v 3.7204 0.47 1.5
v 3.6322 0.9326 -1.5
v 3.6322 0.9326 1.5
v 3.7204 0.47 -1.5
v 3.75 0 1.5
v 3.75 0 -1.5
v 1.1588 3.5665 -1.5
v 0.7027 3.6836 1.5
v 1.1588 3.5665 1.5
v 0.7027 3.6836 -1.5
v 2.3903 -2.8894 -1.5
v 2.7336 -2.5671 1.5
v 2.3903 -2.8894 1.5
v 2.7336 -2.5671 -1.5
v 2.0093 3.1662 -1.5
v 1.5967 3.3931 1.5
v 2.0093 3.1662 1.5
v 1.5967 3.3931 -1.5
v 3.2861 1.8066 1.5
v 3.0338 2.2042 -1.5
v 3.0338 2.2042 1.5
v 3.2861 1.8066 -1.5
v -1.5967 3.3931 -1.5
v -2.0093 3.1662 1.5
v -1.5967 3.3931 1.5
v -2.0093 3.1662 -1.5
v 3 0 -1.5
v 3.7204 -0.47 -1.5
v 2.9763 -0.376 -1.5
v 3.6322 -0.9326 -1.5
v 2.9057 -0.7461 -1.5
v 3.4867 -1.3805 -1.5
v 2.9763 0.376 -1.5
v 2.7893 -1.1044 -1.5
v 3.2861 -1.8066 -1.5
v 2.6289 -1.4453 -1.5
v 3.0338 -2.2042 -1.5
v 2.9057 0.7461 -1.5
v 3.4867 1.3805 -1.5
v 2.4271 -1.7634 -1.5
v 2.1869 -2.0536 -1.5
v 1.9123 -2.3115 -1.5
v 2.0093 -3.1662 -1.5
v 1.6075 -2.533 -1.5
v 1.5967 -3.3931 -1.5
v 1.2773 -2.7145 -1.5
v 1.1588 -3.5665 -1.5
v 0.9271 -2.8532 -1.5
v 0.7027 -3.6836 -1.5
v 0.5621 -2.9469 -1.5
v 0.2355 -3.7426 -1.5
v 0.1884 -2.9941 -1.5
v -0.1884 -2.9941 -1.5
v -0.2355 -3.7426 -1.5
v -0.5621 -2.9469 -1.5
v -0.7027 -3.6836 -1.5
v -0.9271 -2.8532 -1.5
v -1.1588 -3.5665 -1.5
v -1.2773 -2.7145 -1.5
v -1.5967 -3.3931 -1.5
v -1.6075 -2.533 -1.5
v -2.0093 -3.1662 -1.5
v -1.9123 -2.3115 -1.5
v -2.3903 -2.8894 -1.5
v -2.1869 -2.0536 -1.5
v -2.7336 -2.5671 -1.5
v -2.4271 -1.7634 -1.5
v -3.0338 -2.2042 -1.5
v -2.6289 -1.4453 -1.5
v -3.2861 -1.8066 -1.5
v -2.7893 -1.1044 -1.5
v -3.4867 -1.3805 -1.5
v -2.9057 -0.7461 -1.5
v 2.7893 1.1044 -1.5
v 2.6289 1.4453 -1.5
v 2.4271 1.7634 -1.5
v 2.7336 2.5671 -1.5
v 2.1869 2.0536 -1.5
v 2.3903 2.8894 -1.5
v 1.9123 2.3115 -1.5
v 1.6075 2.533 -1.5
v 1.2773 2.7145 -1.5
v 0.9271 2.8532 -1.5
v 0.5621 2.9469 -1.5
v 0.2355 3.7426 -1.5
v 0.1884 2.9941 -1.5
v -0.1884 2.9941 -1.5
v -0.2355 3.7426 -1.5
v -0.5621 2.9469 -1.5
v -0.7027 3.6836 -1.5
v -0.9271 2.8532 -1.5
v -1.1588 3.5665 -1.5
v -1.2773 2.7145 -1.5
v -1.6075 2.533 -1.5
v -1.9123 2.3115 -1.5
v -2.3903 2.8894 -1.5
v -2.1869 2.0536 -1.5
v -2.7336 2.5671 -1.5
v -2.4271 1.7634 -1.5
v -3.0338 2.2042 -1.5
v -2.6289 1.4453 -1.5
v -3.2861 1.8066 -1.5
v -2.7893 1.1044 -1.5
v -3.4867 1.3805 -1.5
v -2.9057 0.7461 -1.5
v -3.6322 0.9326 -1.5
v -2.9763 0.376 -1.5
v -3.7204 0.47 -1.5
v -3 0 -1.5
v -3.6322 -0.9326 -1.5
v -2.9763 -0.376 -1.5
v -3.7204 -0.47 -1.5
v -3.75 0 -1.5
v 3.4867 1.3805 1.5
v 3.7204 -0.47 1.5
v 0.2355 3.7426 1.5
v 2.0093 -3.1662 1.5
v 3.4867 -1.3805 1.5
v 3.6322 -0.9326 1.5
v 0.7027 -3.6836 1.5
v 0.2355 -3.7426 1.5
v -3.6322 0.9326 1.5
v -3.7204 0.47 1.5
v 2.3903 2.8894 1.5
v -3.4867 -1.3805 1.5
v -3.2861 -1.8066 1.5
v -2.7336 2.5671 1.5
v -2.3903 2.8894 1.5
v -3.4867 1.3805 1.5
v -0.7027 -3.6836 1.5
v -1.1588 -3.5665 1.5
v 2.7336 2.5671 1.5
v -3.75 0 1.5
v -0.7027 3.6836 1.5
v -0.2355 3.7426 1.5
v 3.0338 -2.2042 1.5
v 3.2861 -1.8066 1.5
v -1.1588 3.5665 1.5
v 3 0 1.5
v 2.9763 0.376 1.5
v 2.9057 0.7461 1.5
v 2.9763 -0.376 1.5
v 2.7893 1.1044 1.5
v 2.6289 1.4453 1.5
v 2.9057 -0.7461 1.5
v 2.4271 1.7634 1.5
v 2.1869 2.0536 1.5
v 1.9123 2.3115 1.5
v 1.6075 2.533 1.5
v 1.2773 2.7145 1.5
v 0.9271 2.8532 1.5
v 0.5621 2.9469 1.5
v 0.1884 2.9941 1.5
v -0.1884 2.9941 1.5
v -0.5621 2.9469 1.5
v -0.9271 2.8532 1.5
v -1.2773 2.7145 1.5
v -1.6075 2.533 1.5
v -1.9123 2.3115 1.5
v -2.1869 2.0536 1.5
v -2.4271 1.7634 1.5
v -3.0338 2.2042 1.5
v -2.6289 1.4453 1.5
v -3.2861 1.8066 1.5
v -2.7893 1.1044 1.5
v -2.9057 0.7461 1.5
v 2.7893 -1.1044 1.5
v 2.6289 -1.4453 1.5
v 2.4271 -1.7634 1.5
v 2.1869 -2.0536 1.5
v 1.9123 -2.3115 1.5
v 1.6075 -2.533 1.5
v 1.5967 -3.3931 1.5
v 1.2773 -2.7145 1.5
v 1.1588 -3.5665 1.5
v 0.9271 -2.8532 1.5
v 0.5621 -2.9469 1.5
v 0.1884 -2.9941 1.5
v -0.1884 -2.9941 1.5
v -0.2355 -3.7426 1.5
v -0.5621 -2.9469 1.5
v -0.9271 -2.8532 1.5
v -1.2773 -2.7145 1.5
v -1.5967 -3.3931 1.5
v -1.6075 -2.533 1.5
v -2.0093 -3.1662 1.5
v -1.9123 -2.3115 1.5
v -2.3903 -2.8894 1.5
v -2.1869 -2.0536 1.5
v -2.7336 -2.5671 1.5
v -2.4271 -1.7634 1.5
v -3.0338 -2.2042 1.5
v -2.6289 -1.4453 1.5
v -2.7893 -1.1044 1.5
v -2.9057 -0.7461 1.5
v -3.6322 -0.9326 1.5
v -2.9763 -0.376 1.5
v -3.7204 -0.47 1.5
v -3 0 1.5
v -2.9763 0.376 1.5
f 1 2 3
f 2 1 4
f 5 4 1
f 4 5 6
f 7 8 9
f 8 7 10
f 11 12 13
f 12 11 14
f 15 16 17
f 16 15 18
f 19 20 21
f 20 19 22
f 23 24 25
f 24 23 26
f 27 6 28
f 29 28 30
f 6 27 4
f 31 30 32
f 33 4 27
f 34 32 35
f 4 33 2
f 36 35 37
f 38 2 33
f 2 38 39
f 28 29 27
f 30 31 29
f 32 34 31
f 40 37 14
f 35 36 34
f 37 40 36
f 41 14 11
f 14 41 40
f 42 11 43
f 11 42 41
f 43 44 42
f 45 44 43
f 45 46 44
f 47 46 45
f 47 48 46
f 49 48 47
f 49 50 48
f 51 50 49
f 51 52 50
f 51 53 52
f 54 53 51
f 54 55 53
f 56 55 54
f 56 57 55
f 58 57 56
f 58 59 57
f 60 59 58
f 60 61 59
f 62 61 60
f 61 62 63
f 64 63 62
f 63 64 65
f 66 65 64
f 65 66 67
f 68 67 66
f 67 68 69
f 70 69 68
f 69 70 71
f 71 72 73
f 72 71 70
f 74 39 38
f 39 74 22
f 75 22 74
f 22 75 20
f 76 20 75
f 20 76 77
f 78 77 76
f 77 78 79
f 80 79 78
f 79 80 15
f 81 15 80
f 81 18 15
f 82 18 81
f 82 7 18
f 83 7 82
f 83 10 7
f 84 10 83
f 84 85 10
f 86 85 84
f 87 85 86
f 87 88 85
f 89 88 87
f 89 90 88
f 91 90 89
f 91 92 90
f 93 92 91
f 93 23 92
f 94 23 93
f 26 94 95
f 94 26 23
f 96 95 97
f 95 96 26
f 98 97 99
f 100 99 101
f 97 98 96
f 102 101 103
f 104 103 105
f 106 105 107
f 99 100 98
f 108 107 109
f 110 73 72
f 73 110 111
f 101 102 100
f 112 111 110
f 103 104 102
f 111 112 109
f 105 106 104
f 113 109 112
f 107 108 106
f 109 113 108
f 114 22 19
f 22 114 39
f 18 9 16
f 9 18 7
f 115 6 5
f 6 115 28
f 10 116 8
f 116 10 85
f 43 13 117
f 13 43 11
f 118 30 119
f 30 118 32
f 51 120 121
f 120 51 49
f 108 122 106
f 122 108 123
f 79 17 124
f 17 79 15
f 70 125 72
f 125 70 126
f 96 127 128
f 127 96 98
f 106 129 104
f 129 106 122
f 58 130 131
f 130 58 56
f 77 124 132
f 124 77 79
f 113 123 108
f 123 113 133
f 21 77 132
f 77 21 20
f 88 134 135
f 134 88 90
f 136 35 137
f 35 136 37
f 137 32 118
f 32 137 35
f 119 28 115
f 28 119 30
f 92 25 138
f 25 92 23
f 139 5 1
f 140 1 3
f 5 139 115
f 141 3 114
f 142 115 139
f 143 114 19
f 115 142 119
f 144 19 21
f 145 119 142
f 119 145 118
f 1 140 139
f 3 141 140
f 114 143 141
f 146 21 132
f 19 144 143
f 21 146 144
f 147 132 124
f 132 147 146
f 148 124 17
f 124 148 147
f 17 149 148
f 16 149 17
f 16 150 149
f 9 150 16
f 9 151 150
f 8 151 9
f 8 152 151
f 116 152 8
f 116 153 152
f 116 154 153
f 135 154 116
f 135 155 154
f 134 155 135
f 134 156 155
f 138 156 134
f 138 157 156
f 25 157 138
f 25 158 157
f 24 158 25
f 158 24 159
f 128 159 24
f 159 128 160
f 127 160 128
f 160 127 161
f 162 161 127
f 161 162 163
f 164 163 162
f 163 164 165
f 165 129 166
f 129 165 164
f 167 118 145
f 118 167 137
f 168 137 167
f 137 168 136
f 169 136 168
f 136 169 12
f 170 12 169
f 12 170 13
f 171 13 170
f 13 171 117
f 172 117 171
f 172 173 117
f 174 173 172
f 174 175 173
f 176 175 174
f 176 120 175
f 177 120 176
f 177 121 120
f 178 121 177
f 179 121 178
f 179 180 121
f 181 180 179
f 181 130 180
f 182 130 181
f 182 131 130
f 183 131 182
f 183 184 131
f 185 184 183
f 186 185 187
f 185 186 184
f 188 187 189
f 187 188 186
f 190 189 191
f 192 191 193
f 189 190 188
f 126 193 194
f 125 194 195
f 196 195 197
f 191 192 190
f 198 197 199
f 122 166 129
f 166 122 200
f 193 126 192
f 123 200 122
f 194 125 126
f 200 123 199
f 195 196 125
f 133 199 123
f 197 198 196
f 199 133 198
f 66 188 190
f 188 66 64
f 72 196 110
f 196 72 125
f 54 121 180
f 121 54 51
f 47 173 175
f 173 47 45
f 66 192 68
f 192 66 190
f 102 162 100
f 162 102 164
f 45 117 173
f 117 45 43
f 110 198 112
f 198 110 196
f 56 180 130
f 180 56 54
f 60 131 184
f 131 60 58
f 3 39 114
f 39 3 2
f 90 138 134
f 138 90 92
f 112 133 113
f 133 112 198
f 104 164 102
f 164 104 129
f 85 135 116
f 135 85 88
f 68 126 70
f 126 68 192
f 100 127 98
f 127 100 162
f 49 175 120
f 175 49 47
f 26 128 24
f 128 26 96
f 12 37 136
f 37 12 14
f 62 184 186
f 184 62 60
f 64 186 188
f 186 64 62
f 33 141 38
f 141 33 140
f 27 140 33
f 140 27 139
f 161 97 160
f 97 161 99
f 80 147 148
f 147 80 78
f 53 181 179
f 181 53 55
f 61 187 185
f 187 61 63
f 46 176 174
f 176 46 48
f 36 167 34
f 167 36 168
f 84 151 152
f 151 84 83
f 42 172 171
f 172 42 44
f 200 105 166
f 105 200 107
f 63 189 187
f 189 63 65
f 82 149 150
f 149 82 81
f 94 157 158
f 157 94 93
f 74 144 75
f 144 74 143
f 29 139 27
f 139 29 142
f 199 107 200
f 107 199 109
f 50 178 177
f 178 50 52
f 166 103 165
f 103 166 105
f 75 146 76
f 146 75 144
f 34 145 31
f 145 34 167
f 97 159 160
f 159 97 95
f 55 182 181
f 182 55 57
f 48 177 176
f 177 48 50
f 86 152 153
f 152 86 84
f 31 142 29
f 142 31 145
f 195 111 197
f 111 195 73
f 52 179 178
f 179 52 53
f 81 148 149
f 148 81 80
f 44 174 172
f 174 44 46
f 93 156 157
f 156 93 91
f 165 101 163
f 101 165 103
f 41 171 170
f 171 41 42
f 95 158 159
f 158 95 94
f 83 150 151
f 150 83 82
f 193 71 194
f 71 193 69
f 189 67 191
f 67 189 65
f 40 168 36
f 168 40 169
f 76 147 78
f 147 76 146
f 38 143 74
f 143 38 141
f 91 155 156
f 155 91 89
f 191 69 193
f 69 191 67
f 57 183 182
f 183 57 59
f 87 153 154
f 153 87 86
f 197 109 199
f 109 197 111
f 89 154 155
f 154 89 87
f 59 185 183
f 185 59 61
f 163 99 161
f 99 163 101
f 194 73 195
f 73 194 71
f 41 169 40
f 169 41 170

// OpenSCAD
$fn = 50;


difference() {
	union() {
		translate(v = [0, 0, -1.5000000000]) {
			cylinder(h = 3, r = 3.7500000000);
		}
	}
	union() {
		translate(v = [0, 0, -100.0000000000]) {
			cylinder(h = 200, r = 3.0000000000);
		}
	}
}
